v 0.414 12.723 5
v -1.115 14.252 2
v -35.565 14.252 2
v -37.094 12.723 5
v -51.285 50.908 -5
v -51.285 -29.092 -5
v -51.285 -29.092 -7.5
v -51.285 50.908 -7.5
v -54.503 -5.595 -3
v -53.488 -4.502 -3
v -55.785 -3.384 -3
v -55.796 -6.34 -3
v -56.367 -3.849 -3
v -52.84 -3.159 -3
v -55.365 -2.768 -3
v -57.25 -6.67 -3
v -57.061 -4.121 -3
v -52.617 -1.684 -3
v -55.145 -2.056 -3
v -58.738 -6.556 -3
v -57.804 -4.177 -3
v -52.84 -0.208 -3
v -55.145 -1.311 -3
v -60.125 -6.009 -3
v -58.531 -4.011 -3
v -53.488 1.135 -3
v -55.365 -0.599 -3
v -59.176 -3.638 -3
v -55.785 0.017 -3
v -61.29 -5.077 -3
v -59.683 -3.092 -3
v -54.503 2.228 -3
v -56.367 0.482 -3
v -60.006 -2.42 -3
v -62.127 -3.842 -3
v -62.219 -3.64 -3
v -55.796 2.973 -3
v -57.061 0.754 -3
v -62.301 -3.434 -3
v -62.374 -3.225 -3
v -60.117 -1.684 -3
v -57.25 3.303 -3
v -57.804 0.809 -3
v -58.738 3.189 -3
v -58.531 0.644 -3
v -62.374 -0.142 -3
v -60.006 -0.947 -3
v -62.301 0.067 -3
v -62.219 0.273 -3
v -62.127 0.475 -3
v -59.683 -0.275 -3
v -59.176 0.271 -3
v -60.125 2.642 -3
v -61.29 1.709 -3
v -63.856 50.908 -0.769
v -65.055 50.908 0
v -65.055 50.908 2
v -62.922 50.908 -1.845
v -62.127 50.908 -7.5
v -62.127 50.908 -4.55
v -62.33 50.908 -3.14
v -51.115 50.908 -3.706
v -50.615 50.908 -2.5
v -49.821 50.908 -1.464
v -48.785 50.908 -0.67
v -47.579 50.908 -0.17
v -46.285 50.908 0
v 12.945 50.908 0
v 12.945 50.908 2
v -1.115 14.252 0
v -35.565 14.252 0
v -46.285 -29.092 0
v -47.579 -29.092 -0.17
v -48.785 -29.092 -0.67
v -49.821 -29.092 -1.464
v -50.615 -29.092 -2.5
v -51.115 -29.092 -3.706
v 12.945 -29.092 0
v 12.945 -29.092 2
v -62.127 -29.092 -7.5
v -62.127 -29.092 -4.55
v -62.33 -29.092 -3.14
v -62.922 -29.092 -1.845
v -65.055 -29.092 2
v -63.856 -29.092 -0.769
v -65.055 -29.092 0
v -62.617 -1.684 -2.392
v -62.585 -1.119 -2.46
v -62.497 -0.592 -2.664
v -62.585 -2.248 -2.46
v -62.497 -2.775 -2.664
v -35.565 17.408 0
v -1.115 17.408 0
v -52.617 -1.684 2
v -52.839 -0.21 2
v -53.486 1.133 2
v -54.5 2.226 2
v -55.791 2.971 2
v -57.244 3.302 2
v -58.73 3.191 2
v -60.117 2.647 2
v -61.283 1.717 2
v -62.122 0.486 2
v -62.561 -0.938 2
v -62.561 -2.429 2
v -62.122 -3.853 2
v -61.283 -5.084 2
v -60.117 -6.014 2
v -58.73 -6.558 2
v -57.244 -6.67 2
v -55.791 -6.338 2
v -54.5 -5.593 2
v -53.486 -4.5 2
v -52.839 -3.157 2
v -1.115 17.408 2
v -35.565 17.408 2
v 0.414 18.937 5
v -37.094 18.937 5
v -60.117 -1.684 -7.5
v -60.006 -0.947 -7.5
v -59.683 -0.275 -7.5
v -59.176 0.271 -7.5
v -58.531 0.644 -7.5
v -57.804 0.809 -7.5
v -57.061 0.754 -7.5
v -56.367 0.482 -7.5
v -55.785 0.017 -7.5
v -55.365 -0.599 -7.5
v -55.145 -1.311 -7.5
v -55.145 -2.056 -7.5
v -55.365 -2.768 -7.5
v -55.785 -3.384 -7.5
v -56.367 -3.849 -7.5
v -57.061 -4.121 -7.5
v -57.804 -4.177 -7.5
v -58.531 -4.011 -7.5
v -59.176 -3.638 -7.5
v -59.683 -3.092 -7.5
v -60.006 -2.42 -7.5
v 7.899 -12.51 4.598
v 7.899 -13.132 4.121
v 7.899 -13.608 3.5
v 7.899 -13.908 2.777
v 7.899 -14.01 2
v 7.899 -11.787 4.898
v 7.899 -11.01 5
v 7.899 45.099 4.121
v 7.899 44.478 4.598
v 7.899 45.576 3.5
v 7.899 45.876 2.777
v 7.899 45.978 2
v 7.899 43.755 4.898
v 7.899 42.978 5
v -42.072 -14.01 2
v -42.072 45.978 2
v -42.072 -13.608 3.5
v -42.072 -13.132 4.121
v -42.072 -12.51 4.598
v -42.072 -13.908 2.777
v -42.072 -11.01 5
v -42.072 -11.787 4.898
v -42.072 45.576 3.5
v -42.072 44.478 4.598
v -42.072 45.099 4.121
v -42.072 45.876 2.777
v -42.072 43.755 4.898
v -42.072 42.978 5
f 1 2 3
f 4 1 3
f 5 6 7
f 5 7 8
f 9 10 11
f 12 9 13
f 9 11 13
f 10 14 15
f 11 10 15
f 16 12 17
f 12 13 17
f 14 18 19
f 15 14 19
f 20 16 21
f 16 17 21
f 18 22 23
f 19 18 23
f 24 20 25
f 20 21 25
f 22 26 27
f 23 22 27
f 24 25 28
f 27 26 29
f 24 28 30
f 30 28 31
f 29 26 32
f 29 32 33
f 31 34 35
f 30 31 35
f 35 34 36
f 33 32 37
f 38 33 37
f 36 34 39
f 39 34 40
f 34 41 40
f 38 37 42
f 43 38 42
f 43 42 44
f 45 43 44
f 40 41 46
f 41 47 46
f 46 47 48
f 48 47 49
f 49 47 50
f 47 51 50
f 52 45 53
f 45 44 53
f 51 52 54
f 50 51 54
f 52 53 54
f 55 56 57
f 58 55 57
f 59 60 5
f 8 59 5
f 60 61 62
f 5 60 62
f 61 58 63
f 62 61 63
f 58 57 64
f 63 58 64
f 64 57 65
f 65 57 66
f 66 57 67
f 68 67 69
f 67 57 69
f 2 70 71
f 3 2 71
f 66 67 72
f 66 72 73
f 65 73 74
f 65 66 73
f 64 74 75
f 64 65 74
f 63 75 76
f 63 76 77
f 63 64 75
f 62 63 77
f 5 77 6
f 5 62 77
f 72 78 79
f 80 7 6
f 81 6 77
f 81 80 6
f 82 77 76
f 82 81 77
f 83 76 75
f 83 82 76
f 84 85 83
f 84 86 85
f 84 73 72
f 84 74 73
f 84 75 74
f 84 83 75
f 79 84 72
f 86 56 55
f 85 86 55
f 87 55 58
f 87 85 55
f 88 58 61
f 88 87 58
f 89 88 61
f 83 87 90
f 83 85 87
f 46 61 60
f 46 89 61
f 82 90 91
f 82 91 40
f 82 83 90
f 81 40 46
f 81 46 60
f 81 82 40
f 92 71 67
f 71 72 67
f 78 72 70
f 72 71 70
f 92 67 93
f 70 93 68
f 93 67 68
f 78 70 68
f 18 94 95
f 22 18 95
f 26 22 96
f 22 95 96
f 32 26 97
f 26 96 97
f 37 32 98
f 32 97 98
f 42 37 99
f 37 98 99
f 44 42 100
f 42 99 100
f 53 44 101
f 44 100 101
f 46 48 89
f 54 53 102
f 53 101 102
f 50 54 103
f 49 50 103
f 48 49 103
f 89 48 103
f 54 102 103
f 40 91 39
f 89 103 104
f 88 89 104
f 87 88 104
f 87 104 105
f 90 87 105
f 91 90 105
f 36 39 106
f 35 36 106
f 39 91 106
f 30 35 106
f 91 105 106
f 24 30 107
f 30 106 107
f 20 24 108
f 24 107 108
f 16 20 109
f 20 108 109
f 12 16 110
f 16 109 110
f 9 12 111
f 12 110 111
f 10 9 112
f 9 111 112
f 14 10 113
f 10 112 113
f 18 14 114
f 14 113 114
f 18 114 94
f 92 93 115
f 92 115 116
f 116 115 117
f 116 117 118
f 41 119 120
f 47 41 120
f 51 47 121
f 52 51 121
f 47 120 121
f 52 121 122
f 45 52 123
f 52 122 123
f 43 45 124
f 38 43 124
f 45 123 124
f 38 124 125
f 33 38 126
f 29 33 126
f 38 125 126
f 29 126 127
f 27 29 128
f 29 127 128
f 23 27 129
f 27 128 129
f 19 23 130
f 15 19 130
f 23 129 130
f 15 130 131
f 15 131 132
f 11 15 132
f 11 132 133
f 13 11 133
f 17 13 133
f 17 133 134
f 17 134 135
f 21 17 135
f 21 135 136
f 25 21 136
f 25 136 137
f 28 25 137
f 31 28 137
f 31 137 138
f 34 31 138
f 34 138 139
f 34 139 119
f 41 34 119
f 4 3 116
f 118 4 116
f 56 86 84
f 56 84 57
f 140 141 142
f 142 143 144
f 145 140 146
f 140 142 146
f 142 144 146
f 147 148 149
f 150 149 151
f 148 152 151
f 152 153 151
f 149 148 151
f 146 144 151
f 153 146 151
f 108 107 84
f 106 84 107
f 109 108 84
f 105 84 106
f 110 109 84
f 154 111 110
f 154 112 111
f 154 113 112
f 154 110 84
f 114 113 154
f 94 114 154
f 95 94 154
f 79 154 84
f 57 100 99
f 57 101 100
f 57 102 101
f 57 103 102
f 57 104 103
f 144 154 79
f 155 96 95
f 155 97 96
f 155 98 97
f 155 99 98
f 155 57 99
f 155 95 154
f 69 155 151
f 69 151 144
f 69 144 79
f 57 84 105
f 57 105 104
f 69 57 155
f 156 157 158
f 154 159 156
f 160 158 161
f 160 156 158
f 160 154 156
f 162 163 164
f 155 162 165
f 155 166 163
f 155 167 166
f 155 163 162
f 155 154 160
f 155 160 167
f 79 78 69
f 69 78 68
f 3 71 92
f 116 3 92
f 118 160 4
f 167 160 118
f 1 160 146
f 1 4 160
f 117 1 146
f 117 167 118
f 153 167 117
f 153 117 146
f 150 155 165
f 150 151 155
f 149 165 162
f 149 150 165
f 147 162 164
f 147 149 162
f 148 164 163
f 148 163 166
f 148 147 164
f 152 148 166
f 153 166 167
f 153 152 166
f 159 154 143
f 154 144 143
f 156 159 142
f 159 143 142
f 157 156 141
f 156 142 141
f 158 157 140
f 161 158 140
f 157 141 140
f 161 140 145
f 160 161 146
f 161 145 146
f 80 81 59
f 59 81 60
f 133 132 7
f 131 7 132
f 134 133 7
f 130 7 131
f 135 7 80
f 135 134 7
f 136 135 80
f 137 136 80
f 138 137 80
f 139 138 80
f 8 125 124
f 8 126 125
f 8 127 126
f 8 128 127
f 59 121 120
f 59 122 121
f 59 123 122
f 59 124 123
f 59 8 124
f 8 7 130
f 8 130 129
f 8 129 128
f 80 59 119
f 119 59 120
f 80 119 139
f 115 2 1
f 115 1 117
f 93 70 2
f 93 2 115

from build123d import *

# Parameters (mm, degrees)
SKETCH1_W           = 78
SKETCH1_H           = 80
BOSS_EXTRUDE1_DEPTH = 2
SKETCH2_W           = 34.450546123
SKETCH2_H           = 3.156291742
CUT_EXTRUDE1_DEPTH  = 10
SKETCH3_W           = 10.842335807
SKETCH3_H           = 80
BOSS_EXTRUDE2_DEPTH = 7.5
SKETCH4_R           = 2.5
CUT_EXTRUDE2_DEPTH  = 20
SKETCH5_R           = 5
CUT_EXTRUDE3_DEPTH  = 5
FILLET1_R           = 5
SKETCH8_W           = 49.971339188
SKETCH8_H           = 59.988397901
BOSS_EXTRUDE3_DEPTH = 3
FILLET3_R           = 3
SKETCH9_W           = 34.450546123
SKETCH9_H           = 3.156291742
CUT_EXTRUDE4_DEPTH  = 3
CUT_EXTRUDE4_DRAFT  = 27


# Some blends are built 0.0001 mm under size
with BuildPart() as part:
    # Sketch1 → Boss-Extrude1 (new body)
    with BuildSketch(Plane.XY):
        with Locations((-26.054678924, 10.907965965)):
            Rectangle(SKETCH1_W, SKETCH1_H)
    extrude(amount=BOSS_EXTRUDE1_DEPTH)

    # Sketch2 → Cut-Extrude1 (cut)
    with BuildSketch(Plane(origin=(0, 0, 0), x_dir=(-1, 0, 0), z_dir=(0, 0, -1))):
        with Locations((18.339951986, 15.829820094)):
            Rectangle(SKETCH2_W, SKETCH2_H)
    extrude(amount=-CUT_EXTRUDE1_DEPTH, mode=Mode.SUBTRACT)

    # Sketch3 → Boss-Extrude2 (add)
    with BuildSketch(Plane(origin=(0, 0, 0), x_dir=(-1, 0, 0), z_dir=(0, 0, -1))):
        with Locations((56.706233252, 10.907965965)):
            Rectangle(SKETCH3_W, SKETCH3_H)
    extrude(amount=BOSS_EXTRUDE2_DEPTH)

    # Sketch4 → Cut-Extrude2 (cut)
    with BuildSketch(Plane(origin=(0, 0, -7.5), x_dir=(-1, 0, 0), z_dir=(0, 0, -1))):
        with Locations((57.617298924, -1.683561388)):
            Circle(SKETCH4_R)
    extrude(amount=-CUT_EXTRUDE2_DEPTH, mode=Mode.SUBTRACT)

    # Sketch5 → Cut-Extrude3 (cut)
    with BuildSketch(Plane.XY.offset(2)):
        with Locations((-57.617298924, -1.683561388)):
            Circle(SKETCH5_R)
    extrude(amount=-CUT_EXTRUDE3_DEPTH, mode=Mode.SUBTRACT)

    # Fillet1
    # the kernel refuses this fillet: 5 mm, written as the material it adds along each edge
    with BuildSketch(Plane(origin=(-51.285065348, 50.907965965, 0), x_dir=(1, 0, 0), z_dir=(0, -1, 0))) as fillet1_piece_1:
        with BuildLine():
            CenterArc((FILLET1_R, -FILLET1_R), FILLET1_R, 90, 90)
            Line((0, -FILLET1_R), (0, 0))
            Line((0, 0), (FILLET1_R, 0))
        make_face()
    extrude(amount=80)
    # the kernel refuses this fillet: 5 mm, written as the material it adds along each edge
    with BuildSketch(Plane(origin=(-62.127401155, -29.092034035, 0), x_dir=(0, 0, -1), z_dir=(0, 1, 0))) as fillet1_2_piece_1_section:
        with BuildLine():
            CenterArc((4.550145333, 5), FILLET1_R, 204.490631369, 65.509368631)
            Line((0, 2.927277769), (0, 0))
            Line((0, 0), (4.550145333, 0))
        make_face()
    fillet1_2_piece_1 = extrude(amount=36.625369426, mode=Mode.PRIVATE)
    fillet1_2_piece_1 = split(fillet1_2_piece_1, bisect_by=Plane(origin=(-62.127401155, -29.092034035, -3), z_dir=(0, 0, -1)), keep=Keep.TOP, mode=Mode.PRIVATE)
    add(fillet1_2_piece_1)
    with BuildSketch(Plane(origin=(-62.127401155, -29.092034035, 0), x_dir=(0, 0, -1), z_dir=(0, 1, 0))) as fillet1_2_piece_2_section:
        with BuildLine():
            CenterArc((4.550145333, 5), FILLET1_R, 204.490631369, 65.509368631)
            Line((0, 2.927277769), (0, 0))
            Line((0, 0), (4.550145333, 0))
        make_face()
    fillet1_2_piece_2 = extrude(amount=36.625369426, mode=Mode.PRIVATE)
    fillet1_2_piece_2 = fillet1_2_piece_2 - Plane(origin=(-57.617298924, -1.683561388, 0), x_dir=(1, 0, 0), z_dir=(0, 0, 1)) * Cylinder(5, 92, mode=Mode.PRIVATE)
    add(fillet1_2_piece_2)
    # the kernel refuses this fillet: 5 mm, written as the material it adds along each edge
    with BuildSketch(Plane(origin=(-62.127401155, 7.533335391, 0), x_dir=(-1, 0, 0), z_dir=(0, 1, 0))) as fillet1_3_piece_1:
        with BuildLine():
            CenterArc((5, -4.550145333), FILLET1_R, 114.490631369, 65.509368631)
            Line((0, -4.550145333), (0, 0))
            Line((0, 0), (2.927277769, 0))
        make_face()
    extrude(amount=43.374630574)
    # the kernel refuses this fillet: 5 mm, written as the material it takes off along each edge

    # Sketch8 → Boss-Extrude3 (add)
    with BuildSketch(Plane.XY.offset(2)):
        with Locations((-17.086726302, 15.98380471)):
            Rectangle(SKETCH8_W, SKETCH8_H)
    extrude(amount=BOSS_EXTRUDE3_DEPTH)

    # Fillet3
    fillet3_edges = [part.edges().sort_by_distance(p)[0] for p in [
        (-17.086726302, -14.010394241, 5),
        (-17.086726302, 45.97800366, 5),
    ]]
    fillet(fillet3_edges, radius=FILLET3_R - 0.0001)  # a hair under: the kernel refuses the full size


with BuildPart() as cut_extrude4_tool:
    # Sketch9 → Cut-Extrude4 (with draft: the straight prism first)
    with BuildSketch(Plane(origin=(0, 0, 2), x_dir=(-1, 0, 0), z_dir=(0, 0, -1))):
        with Locations((18.339951986, 15.829820094)):
            Rectangle(SKETCH9_W, SKETCH9_H)
    extrude(amount=-CUT_EXTRUDE4_DEPTH)
    # Cut-Extrude4: the draft: its side faces are tilted about the plane it starts from
    cut_extrude4_sides = [cut_extrude4_tool.faces().sort_by_distance(p)[0] for p in [
        (-18.339951986, 17.407965965, 3.5),
        (-1.114678924, 15.829820094, 3.5),
        (-18.339951986, 14.251674223, 3.5),
        (-35.565225047, 15.829820094, 3.5),
    ]]
    draft(cut_extrude4_sides, Plane(origin=(0, 0, 2), x_dir=(-1, 0, 0), z_dir=(0, 0, -1)), CUT_EXTRUDE4_DRAFT)


with BuildPart() as part_1:
    add(part.part)

    # Cut-Extrude4: cut by cut_extrude4_tool
    add(cut_extrude4_tool.part, mode=Mode.SUBTRACT)


solid = part_1.part
